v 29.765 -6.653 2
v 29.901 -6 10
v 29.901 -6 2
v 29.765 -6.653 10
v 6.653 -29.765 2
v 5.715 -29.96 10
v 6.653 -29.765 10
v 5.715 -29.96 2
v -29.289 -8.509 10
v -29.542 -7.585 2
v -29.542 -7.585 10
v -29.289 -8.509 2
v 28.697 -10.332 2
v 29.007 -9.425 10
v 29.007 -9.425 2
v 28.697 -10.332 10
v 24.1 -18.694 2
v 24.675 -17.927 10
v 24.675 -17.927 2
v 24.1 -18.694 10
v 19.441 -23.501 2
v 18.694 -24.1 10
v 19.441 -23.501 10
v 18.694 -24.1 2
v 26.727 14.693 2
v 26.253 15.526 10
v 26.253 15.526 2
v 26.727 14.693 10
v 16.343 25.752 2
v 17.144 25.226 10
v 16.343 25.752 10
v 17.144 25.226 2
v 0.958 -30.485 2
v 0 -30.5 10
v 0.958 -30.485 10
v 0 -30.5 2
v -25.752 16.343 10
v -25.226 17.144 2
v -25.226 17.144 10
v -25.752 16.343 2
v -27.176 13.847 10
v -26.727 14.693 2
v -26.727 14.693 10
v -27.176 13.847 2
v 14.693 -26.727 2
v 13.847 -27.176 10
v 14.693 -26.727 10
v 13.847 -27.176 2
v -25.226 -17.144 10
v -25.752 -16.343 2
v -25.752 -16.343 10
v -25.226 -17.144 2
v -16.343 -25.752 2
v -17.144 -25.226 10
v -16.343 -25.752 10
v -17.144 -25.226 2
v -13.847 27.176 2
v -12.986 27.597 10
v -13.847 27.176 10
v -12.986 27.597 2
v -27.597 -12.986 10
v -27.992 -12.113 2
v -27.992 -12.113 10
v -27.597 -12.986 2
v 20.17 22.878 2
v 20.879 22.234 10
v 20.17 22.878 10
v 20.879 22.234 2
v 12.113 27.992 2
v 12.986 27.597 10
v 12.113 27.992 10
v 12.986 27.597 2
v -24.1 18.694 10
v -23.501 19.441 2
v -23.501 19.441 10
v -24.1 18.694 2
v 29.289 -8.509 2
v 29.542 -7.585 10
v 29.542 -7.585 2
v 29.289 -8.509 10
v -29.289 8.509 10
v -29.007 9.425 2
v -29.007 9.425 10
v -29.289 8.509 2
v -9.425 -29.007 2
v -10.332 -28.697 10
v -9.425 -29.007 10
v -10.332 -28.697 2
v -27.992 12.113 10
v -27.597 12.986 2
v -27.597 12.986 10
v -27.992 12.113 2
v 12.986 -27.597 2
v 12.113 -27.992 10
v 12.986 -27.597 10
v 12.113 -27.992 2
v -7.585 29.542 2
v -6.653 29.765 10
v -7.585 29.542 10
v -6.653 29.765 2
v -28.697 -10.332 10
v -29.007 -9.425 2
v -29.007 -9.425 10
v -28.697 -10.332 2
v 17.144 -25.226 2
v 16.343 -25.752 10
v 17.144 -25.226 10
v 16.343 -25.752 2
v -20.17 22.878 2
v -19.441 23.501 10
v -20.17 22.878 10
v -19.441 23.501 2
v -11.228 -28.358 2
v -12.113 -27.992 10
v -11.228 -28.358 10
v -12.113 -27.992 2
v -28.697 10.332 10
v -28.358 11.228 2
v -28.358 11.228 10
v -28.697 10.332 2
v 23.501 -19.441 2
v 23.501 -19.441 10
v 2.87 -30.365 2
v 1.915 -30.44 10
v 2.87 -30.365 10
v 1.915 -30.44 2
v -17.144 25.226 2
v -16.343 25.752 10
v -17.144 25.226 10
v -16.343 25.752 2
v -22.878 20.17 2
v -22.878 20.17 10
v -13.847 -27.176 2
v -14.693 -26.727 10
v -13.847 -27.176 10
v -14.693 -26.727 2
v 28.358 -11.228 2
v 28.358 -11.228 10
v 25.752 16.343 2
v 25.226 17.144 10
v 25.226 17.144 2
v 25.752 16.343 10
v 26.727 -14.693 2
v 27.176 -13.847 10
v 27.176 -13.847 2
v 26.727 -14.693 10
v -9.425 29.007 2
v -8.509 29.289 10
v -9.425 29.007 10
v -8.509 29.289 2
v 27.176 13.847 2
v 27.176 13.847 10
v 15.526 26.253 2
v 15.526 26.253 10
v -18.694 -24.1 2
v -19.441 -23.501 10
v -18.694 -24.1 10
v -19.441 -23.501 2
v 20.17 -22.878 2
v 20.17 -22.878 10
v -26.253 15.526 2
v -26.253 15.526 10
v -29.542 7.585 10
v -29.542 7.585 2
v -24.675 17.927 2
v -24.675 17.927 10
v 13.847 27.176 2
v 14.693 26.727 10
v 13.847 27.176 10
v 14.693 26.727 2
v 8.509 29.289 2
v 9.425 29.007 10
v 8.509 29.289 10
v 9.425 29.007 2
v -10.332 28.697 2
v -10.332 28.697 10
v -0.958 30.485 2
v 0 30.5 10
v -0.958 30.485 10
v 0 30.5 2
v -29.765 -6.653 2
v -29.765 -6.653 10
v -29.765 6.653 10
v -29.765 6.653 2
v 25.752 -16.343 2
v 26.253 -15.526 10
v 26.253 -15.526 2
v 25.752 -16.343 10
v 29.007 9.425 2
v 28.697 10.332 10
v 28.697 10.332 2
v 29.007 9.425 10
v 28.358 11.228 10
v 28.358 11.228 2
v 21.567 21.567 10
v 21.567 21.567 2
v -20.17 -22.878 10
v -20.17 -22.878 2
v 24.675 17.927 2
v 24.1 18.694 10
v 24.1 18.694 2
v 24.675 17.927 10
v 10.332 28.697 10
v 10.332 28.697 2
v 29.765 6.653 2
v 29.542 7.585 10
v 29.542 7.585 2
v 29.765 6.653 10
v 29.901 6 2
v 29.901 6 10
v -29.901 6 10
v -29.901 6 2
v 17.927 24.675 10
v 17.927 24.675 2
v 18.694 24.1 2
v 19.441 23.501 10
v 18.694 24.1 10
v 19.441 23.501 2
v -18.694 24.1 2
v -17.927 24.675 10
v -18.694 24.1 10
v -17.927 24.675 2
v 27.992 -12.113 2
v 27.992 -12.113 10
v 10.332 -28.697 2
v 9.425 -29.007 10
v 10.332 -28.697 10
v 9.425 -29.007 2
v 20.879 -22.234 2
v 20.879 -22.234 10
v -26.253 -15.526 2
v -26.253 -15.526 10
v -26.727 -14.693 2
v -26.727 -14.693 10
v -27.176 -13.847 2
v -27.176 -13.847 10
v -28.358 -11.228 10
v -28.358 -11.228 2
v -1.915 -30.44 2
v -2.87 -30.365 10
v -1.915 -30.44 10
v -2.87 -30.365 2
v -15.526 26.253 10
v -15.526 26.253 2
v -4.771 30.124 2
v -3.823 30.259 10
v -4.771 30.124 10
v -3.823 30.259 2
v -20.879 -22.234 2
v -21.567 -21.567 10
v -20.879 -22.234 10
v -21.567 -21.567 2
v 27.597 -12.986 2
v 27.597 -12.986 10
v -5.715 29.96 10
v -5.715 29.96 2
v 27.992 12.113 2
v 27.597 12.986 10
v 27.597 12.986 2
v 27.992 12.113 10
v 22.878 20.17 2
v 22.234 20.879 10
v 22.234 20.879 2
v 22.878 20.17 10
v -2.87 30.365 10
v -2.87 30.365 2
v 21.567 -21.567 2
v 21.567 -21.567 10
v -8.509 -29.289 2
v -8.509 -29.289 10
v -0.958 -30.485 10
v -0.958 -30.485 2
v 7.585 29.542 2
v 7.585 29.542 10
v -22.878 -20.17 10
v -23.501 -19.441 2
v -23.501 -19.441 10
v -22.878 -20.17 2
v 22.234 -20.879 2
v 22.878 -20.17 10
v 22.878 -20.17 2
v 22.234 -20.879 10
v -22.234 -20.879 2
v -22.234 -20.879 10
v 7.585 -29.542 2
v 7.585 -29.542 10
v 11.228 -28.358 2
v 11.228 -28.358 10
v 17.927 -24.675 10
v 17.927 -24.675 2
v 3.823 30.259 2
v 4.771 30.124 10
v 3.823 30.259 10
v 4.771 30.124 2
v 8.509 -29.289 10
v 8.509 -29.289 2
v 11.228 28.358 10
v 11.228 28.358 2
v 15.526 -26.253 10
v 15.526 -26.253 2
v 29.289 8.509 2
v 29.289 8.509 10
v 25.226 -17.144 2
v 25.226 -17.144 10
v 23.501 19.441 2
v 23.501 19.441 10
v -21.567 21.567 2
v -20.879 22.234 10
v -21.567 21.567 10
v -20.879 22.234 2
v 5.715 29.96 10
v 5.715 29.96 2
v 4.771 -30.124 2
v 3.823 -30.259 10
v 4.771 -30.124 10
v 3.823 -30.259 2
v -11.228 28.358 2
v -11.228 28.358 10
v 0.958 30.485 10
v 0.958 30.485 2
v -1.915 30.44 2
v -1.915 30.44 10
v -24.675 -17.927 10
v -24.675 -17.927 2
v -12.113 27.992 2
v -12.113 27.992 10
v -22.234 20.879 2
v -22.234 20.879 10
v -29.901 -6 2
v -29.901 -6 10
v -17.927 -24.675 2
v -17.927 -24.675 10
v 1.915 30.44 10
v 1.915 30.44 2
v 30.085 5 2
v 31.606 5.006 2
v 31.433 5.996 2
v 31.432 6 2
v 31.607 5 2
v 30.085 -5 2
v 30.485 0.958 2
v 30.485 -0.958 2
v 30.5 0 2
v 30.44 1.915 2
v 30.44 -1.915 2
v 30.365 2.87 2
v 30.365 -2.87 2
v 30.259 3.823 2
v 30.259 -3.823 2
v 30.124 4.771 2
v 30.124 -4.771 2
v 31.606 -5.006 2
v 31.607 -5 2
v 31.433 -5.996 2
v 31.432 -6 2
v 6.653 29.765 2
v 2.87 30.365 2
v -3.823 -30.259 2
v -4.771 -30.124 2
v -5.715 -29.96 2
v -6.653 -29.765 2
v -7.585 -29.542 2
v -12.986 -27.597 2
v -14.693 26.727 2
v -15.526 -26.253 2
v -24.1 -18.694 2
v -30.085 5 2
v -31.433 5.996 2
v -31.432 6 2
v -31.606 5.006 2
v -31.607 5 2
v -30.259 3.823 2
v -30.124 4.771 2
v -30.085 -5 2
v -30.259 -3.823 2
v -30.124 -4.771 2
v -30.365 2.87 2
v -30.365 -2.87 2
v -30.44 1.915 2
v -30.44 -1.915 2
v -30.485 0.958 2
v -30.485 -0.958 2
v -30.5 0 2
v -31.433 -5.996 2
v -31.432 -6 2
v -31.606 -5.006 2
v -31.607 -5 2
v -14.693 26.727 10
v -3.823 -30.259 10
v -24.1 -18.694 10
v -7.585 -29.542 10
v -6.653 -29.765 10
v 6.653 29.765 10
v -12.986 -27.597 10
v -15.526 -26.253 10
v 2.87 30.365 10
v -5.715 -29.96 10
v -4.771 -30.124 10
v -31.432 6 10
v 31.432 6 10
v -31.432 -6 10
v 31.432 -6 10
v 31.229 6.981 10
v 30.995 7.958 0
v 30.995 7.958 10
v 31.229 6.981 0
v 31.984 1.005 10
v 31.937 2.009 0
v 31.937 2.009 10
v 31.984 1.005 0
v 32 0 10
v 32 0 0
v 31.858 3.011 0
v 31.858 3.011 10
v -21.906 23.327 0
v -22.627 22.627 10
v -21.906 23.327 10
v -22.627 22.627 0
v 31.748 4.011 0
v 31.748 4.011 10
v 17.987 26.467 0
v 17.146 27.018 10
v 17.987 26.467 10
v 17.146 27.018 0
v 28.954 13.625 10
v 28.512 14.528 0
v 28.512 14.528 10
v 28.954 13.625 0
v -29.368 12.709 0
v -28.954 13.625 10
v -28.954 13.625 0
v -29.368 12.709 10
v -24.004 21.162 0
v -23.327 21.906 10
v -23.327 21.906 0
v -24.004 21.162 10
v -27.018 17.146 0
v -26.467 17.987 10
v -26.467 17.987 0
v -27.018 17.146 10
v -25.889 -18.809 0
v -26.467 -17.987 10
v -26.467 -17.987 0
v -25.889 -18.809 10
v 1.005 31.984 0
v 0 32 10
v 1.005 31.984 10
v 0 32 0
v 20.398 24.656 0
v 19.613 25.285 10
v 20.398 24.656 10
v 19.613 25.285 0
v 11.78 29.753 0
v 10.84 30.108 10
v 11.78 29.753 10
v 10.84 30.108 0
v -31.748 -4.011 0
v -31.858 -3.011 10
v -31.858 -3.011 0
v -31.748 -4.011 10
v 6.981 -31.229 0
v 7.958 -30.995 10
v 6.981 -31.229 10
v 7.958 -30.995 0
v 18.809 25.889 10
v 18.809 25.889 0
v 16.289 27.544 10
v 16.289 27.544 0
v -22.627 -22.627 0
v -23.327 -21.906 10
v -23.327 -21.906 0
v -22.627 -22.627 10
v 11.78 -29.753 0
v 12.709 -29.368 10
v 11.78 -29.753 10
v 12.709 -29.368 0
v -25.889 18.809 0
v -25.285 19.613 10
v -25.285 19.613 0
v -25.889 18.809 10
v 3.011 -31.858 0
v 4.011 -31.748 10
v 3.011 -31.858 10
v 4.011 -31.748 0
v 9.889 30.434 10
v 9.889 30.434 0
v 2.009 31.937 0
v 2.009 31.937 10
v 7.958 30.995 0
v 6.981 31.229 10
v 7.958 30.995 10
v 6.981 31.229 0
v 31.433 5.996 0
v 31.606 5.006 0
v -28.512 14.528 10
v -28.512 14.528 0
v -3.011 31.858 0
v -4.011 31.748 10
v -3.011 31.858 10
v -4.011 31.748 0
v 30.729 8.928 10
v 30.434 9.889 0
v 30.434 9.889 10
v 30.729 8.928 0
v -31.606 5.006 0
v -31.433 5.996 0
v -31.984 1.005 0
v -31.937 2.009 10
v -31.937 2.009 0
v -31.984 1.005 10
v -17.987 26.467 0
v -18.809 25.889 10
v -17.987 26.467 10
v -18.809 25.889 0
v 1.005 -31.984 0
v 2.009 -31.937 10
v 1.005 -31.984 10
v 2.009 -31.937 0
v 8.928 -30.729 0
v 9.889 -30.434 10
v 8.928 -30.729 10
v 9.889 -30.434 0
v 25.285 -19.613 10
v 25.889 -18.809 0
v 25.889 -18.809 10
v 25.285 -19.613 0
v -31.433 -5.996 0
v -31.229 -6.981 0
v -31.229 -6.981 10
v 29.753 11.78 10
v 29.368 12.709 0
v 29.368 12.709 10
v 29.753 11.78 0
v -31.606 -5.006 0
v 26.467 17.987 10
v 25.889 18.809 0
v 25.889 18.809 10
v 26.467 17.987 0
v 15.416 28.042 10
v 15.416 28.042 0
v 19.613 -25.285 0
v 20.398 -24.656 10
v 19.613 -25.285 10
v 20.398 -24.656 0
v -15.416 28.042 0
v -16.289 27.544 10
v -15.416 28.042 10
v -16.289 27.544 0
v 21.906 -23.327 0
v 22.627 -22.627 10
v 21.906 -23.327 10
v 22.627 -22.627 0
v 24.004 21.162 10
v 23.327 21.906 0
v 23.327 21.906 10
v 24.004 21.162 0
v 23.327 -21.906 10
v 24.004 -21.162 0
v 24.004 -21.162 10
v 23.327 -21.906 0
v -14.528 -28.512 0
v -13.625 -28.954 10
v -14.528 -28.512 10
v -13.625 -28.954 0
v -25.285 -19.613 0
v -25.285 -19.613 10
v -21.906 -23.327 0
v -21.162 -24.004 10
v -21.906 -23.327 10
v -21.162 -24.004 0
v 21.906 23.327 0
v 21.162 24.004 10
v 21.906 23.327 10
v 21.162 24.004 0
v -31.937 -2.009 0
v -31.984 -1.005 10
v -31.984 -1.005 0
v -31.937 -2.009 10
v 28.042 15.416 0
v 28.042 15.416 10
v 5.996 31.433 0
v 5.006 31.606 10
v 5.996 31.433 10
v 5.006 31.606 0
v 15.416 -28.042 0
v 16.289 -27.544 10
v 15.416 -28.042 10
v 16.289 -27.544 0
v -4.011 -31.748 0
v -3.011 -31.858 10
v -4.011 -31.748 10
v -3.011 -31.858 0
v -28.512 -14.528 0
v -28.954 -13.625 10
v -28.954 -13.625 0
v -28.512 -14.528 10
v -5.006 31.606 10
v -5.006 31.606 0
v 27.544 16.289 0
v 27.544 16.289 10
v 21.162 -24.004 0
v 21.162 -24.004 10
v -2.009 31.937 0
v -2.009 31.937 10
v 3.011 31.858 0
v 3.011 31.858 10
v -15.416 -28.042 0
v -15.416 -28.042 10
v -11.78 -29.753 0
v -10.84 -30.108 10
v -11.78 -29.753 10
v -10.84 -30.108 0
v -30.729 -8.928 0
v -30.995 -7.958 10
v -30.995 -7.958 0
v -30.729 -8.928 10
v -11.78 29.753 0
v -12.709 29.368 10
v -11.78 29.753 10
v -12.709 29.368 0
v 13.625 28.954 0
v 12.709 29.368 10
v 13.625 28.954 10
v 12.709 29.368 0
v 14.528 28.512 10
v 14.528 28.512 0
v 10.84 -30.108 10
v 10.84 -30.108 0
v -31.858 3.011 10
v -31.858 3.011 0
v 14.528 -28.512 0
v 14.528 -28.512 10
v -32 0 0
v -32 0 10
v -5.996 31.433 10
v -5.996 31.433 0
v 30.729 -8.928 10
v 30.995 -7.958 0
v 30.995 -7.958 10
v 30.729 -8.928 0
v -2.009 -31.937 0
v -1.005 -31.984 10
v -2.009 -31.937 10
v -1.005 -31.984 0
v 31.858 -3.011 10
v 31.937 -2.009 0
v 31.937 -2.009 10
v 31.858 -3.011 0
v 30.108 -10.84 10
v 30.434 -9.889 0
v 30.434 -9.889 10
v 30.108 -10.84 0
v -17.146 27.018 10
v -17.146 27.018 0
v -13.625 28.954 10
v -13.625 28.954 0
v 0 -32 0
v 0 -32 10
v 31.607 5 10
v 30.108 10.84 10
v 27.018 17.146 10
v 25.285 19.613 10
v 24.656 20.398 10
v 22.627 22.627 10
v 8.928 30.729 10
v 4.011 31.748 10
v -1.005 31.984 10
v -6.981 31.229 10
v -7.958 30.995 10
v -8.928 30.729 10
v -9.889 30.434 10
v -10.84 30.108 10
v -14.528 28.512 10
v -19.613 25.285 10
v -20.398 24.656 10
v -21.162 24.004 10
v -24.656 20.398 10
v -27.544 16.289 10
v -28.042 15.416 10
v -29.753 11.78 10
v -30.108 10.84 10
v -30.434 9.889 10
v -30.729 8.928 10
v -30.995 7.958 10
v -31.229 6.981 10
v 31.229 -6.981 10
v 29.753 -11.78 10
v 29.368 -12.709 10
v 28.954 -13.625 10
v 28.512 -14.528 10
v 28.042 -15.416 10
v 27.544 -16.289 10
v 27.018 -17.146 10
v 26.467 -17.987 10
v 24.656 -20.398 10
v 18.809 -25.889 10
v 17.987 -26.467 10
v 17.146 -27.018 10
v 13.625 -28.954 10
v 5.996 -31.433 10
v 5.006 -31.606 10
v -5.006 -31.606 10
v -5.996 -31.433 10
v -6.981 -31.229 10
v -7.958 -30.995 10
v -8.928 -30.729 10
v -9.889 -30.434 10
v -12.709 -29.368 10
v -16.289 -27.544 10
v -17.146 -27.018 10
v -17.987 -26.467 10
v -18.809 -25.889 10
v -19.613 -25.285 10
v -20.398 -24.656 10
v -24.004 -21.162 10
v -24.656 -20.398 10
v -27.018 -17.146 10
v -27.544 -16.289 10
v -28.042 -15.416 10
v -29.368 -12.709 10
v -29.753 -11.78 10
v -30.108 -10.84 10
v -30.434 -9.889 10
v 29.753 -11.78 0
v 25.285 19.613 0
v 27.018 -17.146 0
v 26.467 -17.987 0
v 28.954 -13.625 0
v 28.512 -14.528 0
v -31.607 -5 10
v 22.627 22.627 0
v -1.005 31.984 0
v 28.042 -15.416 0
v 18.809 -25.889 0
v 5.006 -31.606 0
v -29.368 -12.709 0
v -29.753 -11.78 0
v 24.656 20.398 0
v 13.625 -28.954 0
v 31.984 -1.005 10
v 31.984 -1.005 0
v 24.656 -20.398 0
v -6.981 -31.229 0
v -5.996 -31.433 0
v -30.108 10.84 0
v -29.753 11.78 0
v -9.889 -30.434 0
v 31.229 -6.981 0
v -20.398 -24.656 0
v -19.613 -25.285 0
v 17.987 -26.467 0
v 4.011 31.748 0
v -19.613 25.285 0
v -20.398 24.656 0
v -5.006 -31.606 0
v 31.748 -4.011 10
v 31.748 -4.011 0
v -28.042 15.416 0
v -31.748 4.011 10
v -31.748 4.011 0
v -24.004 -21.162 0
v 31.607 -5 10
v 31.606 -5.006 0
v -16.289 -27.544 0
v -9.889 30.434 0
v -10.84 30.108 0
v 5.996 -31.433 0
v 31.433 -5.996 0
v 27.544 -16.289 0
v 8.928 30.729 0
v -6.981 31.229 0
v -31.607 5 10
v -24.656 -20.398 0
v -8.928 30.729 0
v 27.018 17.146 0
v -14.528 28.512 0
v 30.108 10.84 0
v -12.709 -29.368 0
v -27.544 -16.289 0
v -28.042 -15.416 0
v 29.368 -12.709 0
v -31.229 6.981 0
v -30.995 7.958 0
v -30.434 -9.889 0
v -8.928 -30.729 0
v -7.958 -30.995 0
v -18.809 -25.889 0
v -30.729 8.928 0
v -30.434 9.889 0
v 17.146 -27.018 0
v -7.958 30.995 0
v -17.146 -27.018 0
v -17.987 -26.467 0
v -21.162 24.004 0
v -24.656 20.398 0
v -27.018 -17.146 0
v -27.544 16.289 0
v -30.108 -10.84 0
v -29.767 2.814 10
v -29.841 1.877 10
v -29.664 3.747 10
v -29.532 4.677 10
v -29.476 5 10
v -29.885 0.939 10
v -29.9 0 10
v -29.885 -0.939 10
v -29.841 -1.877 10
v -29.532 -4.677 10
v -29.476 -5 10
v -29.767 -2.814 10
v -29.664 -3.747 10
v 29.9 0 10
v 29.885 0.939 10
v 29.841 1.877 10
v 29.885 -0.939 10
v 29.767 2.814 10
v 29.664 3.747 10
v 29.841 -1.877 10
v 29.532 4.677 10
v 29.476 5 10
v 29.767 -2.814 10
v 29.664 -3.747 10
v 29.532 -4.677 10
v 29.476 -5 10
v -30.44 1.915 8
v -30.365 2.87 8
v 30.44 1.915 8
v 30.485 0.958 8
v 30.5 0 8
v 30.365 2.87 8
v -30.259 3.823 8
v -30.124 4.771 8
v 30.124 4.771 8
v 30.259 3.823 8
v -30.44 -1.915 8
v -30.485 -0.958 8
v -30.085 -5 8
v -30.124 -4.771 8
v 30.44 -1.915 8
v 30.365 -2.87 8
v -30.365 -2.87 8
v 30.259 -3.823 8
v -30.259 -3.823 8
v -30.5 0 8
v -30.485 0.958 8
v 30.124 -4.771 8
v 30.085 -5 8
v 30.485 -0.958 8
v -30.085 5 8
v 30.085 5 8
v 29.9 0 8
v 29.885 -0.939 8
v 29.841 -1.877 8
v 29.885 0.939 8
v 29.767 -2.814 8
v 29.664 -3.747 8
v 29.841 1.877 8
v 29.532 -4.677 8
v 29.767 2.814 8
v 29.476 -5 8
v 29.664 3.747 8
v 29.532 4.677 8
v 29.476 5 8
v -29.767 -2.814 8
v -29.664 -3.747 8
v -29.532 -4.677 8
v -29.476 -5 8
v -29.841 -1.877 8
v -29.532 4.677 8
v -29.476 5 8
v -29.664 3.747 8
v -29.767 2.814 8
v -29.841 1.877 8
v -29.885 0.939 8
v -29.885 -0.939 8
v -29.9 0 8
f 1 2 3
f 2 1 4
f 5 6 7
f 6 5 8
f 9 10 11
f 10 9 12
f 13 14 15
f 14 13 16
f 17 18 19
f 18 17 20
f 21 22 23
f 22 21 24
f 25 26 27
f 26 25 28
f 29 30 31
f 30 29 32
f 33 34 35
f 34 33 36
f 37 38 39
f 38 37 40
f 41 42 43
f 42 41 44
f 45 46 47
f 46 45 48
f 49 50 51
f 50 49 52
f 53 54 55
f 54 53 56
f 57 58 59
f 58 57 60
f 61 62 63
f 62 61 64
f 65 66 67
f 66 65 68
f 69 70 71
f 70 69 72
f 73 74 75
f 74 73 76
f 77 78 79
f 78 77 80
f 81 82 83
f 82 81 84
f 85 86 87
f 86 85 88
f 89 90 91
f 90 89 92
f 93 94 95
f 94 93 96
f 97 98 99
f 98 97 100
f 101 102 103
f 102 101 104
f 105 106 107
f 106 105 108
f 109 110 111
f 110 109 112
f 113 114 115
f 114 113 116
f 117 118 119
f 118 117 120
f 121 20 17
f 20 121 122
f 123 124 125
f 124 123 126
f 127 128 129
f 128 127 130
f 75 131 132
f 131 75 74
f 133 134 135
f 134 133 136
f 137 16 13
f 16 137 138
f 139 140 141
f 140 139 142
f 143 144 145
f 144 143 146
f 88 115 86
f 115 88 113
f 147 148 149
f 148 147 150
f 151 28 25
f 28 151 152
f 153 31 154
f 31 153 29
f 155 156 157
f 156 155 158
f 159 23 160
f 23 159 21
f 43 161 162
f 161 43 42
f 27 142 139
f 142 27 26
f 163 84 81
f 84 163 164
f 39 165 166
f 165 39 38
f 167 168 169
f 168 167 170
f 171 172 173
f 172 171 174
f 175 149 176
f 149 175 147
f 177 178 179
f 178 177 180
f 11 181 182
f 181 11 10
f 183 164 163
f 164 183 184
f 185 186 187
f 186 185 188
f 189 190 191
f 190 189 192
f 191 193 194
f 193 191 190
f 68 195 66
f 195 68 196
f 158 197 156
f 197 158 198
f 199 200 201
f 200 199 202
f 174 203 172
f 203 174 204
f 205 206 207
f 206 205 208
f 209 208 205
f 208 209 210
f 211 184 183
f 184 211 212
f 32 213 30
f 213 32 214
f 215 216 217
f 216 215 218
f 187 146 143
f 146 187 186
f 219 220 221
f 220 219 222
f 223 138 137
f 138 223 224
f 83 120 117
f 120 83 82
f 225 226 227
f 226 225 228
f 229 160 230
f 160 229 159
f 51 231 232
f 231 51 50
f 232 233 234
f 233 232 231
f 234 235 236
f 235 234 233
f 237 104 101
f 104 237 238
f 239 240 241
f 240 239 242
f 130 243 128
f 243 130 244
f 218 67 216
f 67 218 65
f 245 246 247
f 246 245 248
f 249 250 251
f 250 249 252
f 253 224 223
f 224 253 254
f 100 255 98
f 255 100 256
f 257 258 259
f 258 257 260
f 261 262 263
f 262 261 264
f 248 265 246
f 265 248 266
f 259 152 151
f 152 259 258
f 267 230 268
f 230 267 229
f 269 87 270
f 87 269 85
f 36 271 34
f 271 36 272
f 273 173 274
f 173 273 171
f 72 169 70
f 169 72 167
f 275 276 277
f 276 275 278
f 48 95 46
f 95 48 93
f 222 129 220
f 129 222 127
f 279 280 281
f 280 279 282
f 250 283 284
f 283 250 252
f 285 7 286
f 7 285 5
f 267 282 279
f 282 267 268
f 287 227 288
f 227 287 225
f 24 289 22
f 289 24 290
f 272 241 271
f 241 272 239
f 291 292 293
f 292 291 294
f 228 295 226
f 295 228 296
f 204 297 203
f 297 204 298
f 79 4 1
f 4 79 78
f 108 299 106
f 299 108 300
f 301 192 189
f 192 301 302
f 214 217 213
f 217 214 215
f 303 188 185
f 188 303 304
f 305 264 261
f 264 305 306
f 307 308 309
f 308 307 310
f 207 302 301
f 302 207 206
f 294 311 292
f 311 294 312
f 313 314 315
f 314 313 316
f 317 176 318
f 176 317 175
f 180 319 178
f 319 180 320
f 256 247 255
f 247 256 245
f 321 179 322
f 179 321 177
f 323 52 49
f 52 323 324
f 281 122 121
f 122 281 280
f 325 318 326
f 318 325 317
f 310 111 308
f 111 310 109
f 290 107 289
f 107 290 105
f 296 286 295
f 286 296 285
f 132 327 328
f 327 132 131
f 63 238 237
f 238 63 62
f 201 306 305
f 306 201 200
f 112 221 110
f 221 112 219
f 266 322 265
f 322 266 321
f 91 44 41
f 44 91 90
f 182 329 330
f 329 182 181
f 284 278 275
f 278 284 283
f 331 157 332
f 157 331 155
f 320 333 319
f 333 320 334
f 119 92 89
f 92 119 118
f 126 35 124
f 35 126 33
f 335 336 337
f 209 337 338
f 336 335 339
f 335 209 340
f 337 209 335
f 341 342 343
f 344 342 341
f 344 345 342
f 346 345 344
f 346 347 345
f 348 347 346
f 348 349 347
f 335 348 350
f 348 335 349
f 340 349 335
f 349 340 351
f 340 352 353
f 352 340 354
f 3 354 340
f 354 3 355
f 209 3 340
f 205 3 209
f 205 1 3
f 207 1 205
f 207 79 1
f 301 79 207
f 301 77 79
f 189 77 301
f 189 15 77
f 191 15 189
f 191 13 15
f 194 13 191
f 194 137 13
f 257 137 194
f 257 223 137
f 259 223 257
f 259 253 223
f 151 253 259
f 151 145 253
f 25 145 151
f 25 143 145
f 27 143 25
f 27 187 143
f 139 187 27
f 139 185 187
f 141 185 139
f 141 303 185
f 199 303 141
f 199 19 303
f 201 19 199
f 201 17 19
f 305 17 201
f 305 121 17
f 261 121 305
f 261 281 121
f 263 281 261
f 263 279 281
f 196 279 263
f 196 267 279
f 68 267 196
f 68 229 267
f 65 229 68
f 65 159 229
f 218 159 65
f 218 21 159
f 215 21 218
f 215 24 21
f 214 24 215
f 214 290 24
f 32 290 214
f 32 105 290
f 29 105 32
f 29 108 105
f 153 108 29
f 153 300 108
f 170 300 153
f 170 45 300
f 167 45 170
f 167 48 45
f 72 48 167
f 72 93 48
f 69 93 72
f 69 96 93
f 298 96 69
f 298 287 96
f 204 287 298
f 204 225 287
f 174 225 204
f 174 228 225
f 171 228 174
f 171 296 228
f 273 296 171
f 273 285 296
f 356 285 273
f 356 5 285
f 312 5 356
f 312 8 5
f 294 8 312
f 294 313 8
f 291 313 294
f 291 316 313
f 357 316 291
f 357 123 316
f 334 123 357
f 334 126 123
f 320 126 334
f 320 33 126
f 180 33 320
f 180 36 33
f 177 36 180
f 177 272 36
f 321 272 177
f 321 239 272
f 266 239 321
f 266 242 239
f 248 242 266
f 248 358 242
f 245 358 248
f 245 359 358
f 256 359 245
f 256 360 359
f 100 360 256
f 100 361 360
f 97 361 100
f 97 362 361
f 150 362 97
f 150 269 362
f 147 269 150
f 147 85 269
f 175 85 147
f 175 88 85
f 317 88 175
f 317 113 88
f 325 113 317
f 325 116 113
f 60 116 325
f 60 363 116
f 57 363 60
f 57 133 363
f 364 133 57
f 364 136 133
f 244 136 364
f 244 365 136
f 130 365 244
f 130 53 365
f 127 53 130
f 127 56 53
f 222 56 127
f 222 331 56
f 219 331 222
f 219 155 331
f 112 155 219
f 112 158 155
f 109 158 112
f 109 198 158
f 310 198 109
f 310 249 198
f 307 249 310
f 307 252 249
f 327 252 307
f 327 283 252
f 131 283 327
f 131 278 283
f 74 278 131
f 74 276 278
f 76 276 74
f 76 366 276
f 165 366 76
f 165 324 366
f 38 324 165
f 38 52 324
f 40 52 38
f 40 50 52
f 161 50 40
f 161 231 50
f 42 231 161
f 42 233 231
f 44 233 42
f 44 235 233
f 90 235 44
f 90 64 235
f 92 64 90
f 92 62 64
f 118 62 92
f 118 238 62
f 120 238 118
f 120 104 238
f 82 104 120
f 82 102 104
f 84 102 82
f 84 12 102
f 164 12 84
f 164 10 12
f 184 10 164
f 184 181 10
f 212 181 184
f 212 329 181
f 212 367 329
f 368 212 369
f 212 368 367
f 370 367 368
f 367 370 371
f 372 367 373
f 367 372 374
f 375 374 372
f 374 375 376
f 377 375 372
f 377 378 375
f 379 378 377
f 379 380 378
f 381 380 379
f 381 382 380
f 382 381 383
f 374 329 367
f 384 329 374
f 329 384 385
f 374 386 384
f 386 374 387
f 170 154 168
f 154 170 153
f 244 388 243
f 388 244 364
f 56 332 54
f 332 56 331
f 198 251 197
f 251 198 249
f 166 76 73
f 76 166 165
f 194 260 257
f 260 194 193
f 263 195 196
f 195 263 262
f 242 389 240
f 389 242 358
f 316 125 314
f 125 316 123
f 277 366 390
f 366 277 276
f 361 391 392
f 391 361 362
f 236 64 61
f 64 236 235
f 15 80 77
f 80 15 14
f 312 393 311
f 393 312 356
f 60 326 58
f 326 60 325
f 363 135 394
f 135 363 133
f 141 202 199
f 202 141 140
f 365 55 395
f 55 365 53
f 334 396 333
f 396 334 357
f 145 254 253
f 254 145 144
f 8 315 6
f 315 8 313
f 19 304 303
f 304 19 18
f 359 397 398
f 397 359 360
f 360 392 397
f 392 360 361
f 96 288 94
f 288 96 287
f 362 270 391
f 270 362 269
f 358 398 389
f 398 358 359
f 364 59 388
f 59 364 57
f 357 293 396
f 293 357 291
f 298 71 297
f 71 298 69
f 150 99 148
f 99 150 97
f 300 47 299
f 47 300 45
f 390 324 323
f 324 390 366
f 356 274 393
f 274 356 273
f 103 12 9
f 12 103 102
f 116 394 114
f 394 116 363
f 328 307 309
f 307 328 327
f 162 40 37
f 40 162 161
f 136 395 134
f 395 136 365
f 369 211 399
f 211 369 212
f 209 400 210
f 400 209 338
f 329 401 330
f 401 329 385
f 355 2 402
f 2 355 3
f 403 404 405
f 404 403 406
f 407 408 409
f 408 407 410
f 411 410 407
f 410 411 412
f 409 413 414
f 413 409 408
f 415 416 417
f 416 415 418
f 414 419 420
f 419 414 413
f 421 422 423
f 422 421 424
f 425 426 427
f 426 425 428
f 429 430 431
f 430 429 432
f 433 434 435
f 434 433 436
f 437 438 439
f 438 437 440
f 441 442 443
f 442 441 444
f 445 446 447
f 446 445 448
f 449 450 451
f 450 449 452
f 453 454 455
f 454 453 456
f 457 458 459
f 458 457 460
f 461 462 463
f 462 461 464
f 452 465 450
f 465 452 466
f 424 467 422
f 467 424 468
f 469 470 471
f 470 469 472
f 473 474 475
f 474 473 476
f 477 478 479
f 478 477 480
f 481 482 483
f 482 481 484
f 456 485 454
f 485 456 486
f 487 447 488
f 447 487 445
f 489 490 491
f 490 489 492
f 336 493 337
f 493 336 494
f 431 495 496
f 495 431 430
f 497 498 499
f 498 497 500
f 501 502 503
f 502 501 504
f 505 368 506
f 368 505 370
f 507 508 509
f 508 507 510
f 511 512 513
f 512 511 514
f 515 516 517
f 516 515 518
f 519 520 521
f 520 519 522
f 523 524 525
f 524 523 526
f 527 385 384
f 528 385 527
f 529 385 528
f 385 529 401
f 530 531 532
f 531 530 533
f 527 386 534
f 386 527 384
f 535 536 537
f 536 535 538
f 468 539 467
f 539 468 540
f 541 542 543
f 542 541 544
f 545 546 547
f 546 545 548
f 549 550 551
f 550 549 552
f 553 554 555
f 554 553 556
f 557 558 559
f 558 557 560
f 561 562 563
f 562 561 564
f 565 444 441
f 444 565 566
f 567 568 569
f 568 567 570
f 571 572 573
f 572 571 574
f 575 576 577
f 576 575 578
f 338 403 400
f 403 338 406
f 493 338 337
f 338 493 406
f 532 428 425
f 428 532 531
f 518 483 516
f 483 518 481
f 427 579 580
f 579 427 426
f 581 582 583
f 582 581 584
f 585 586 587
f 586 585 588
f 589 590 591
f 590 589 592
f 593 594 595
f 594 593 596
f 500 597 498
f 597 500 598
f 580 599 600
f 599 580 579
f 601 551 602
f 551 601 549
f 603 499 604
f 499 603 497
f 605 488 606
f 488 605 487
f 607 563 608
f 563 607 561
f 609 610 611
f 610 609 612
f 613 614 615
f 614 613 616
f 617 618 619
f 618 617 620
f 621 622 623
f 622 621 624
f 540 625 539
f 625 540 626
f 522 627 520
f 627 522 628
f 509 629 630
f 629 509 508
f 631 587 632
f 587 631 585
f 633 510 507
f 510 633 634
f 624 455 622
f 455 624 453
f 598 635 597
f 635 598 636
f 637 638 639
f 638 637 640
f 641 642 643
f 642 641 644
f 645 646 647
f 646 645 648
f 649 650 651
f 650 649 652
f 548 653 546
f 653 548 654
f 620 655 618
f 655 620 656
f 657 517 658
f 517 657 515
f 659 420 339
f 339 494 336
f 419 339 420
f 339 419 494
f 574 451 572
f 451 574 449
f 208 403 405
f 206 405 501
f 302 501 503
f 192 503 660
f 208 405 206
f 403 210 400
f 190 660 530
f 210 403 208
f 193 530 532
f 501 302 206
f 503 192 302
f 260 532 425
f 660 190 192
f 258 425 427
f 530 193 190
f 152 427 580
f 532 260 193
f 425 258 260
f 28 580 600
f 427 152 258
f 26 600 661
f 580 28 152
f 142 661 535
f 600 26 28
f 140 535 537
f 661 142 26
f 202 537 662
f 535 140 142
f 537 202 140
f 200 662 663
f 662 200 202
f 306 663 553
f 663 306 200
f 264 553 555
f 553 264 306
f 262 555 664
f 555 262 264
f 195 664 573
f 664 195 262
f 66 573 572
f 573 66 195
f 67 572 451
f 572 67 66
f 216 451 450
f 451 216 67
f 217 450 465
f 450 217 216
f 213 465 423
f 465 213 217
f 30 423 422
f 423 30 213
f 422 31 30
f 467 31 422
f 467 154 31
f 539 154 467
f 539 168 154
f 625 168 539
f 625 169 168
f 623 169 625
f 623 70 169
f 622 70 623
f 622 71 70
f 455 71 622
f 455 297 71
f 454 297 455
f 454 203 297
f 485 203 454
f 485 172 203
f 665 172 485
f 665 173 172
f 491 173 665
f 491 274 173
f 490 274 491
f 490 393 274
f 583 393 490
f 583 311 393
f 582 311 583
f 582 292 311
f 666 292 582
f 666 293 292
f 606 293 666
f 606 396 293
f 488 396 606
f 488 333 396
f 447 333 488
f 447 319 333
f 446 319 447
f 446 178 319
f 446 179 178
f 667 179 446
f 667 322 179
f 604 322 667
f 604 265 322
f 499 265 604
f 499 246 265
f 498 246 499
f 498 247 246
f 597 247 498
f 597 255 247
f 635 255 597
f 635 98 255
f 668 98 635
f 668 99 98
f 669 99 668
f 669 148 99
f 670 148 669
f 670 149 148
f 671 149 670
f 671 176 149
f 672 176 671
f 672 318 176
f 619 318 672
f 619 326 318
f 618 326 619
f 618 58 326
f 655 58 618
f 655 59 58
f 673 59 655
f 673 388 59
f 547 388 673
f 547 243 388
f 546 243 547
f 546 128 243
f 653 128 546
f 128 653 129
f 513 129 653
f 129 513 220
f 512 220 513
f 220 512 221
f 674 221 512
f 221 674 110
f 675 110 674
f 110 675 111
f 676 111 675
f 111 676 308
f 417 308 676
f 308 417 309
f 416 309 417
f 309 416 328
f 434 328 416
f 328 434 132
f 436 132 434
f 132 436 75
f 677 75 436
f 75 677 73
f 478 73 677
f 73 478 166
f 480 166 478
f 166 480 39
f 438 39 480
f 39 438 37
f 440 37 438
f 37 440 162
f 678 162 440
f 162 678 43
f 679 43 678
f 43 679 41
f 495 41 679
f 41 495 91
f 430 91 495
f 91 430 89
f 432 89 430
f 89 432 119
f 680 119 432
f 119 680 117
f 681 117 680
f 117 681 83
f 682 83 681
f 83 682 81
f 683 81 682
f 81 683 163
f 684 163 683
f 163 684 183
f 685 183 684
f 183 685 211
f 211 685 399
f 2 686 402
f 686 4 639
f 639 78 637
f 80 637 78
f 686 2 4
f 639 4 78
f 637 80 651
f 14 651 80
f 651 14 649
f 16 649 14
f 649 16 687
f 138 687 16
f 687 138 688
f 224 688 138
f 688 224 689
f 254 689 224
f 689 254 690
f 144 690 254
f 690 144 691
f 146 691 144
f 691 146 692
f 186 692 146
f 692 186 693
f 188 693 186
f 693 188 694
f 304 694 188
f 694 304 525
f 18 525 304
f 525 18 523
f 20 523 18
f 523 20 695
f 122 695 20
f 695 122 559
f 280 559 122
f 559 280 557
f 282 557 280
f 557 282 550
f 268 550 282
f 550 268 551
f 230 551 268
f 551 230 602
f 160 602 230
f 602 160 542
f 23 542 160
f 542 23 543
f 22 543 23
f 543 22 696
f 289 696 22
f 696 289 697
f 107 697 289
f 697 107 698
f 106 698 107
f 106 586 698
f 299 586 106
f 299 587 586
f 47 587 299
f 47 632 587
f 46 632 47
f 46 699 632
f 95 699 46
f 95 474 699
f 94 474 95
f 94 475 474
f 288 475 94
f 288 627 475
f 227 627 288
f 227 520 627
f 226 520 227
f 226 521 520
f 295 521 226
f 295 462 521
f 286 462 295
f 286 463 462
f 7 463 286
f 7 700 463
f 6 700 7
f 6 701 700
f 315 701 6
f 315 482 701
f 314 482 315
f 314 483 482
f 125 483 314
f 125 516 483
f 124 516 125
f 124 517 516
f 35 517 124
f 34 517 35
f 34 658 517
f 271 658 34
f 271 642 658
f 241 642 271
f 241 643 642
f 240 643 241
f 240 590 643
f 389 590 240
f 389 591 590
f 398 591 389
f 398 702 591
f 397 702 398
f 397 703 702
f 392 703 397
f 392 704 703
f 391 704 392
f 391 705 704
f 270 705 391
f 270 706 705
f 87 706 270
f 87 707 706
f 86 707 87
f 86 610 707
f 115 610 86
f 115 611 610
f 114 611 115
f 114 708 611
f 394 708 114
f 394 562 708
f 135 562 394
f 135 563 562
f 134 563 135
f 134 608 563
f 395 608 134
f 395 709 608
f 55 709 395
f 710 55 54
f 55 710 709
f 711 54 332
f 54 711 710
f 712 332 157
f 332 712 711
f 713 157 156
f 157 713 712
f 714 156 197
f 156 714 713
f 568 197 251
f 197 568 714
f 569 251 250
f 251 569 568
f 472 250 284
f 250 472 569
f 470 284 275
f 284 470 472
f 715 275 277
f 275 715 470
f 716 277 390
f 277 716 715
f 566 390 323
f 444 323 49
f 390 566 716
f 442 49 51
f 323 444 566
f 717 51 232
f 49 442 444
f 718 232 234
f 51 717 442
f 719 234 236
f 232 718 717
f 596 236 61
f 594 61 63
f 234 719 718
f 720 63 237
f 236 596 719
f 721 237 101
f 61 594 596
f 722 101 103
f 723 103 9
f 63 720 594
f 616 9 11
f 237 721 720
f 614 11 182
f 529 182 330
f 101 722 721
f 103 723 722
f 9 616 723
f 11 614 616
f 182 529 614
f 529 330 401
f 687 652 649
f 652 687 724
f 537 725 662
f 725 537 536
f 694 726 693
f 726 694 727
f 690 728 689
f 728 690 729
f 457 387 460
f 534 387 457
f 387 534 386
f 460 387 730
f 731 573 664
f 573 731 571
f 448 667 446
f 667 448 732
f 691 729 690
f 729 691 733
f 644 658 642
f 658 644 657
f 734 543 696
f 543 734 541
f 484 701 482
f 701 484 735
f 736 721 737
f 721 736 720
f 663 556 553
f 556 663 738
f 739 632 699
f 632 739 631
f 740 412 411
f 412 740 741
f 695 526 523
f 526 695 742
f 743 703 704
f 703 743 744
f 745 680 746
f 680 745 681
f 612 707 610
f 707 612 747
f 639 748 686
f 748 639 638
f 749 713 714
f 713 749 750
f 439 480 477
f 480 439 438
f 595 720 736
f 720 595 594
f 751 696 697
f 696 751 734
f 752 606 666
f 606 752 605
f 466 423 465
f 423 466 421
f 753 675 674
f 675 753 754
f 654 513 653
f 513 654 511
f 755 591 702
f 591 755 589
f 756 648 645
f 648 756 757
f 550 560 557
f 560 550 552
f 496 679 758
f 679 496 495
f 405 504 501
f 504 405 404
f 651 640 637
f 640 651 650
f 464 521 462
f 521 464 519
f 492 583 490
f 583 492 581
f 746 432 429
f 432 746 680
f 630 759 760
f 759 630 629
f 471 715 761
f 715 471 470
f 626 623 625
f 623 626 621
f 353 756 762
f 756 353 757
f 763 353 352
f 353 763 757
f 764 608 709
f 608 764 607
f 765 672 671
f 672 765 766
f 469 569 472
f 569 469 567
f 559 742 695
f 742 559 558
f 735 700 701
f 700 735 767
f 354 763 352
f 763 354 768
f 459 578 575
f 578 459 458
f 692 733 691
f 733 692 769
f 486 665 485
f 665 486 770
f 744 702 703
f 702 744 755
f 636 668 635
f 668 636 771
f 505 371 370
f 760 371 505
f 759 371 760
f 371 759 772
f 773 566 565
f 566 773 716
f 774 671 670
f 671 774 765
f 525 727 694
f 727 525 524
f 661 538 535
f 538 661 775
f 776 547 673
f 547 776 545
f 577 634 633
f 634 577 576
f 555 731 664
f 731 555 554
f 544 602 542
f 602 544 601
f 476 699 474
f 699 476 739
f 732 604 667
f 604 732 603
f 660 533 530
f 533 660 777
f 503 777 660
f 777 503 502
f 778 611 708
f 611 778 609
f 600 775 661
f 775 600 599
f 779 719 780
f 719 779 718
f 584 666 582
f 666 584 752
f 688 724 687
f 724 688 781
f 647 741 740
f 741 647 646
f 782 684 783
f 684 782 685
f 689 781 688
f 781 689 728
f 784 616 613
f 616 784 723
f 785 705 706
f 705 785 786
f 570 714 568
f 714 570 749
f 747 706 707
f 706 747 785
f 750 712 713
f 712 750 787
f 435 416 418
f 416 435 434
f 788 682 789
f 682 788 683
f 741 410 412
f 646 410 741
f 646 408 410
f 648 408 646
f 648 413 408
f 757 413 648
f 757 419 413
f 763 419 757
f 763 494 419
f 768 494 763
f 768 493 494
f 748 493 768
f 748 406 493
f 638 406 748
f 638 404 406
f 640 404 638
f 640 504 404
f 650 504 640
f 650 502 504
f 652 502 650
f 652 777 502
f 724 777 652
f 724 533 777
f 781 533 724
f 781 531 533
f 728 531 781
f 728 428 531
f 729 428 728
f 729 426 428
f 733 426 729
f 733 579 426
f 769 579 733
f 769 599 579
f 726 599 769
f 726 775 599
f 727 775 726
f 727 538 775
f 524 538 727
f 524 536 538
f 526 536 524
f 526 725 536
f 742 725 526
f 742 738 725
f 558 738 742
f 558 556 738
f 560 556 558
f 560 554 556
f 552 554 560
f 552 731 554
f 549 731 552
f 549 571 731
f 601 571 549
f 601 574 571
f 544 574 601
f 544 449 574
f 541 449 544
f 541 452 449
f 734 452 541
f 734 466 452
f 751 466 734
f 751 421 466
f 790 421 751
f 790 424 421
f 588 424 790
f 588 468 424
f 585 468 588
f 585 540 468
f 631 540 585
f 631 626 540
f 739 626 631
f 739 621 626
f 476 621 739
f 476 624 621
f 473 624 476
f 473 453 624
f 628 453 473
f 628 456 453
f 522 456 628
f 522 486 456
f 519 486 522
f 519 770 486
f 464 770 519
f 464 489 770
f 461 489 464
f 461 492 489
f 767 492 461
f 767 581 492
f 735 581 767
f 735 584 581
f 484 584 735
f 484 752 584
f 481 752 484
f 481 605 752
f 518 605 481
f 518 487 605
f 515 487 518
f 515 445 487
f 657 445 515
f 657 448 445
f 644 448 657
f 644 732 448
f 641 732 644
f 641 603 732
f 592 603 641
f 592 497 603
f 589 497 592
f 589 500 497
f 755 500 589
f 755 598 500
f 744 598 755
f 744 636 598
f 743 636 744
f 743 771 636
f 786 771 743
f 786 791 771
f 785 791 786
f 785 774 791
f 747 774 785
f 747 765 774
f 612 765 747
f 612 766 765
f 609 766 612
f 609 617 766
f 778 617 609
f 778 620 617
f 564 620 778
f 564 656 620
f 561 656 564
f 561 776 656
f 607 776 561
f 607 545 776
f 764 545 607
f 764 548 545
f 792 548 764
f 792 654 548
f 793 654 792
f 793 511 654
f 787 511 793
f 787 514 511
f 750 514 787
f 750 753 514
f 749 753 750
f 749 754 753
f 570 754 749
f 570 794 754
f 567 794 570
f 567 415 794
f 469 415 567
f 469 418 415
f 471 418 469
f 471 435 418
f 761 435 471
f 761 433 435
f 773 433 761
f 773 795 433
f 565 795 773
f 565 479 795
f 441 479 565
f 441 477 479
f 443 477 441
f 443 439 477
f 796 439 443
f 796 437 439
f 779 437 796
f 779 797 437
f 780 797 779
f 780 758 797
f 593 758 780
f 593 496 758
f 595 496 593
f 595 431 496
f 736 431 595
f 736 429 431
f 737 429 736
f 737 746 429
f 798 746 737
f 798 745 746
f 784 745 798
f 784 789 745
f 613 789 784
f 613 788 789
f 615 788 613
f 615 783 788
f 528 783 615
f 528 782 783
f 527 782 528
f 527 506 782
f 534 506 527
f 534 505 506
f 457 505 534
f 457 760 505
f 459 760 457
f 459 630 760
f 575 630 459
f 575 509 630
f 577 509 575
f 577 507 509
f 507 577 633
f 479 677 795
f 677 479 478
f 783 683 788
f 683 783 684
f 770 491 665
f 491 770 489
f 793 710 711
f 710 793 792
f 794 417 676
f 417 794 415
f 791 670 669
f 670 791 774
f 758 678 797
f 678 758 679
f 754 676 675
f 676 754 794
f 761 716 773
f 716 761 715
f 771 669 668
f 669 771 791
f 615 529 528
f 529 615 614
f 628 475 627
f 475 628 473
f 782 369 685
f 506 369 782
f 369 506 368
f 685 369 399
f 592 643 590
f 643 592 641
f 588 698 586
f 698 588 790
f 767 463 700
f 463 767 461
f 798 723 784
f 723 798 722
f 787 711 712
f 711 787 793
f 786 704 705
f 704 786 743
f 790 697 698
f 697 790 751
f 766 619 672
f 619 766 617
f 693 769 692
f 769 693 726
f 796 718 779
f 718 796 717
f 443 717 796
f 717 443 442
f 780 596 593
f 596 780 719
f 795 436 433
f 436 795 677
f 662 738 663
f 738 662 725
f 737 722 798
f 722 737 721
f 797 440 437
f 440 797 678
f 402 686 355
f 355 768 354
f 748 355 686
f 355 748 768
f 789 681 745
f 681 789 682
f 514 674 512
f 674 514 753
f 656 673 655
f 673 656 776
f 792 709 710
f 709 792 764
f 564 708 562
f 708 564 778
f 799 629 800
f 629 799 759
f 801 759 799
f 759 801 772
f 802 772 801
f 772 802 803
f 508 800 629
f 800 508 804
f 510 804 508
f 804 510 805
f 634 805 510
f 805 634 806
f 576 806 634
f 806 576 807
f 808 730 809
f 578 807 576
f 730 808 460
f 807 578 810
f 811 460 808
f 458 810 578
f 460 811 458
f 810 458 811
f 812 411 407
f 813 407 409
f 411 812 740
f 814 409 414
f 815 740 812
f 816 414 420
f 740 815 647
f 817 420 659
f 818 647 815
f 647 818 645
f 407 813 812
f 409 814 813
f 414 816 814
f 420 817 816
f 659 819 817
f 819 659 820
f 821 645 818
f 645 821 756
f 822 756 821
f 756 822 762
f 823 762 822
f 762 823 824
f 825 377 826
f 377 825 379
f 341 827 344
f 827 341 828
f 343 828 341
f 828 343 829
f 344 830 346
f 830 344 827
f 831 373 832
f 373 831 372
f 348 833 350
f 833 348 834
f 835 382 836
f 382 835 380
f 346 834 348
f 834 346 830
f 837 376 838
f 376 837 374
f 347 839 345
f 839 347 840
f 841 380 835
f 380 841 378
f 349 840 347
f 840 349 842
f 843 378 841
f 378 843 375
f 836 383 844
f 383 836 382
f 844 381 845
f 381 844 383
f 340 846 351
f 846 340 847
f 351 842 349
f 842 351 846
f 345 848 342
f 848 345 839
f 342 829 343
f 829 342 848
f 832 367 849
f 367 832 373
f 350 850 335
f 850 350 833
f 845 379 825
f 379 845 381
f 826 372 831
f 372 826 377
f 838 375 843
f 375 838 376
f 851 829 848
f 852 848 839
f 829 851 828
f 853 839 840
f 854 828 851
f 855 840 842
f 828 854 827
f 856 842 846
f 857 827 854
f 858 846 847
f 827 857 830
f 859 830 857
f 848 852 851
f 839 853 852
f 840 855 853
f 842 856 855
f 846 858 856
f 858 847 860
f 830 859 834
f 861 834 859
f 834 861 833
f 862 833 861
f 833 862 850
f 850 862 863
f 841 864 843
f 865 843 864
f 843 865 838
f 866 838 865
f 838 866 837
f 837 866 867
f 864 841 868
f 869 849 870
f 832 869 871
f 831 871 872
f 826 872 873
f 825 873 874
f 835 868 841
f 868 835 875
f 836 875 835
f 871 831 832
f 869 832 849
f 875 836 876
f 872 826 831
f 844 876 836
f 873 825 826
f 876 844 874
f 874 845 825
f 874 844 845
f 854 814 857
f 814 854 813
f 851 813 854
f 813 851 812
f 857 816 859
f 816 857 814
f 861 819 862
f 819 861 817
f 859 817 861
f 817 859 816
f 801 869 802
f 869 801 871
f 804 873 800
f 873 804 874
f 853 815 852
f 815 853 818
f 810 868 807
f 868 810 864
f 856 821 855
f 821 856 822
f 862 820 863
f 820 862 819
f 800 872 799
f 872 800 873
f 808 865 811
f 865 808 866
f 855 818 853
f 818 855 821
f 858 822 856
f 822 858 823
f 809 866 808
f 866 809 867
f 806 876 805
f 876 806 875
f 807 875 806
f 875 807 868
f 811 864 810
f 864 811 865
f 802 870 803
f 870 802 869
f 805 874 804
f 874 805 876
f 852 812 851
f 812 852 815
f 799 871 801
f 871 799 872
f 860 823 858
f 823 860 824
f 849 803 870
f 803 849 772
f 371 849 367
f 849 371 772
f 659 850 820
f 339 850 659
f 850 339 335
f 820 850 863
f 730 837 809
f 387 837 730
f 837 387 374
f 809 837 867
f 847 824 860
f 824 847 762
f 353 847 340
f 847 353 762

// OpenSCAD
// number of segments
$fn = 200;
// inner diameter
inner_diameter = 30;
// cap height. So far, bottom is always 2mm, border is 1mm
cap_height = 10;
// width of the clamps
clamp_width = 10;


module gripper(inner=30,height=10,clampwidth=10) {
	intersection() {
		translate([0,0,5]) cube([inner*2+4,clampwidth,height],center=true);
		difference() {
			cylinder(r=inner+2,h=height);
			cylinder(r=inner+.5,h=height-2);
			cylinder(r=inner-.1,h=height+1);
		}
	}
}
module cap(inner=30,height=10,clampwidth=10) {
difference() {
cylinder(r=inner+2,h=height);
	translate([0,0,2]) {
		cylinder(r=inner + 0.5,h=height);
		translate([0,0,5]) cube([inner*2+4,clampwidth+2,height],center=true);
	}
}
gripper(inner=inner,height=height,clampwidth=clampwidth);
}


cap(inner=inner_diameter, height=cap_height, clampwidth=clamp_width);
